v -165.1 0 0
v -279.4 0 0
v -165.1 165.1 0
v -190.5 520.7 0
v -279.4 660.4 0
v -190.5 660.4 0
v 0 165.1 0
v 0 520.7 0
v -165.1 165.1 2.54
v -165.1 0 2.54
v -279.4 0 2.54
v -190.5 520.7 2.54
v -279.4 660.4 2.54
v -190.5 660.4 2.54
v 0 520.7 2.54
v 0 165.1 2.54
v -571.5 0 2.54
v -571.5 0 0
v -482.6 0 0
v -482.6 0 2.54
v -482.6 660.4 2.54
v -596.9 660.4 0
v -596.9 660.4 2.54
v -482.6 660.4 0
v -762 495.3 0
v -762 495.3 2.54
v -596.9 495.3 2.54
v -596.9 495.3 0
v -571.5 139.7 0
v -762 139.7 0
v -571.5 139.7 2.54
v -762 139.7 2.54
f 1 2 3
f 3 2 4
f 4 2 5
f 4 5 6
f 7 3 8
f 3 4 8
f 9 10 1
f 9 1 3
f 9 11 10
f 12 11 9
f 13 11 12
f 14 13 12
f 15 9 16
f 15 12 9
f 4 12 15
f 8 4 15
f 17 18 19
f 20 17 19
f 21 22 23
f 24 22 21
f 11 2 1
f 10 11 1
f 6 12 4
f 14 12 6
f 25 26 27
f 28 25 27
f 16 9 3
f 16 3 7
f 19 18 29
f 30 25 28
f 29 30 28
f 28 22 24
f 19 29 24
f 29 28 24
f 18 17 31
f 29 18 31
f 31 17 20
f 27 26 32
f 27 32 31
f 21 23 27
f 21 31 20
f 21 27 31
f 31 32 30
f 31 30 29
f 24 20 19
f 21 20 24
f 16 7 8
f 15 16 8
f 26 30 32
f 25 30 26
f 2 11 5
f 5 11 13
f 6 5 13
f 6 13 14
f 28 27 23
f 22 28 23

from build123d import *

# Parameters (mm, degrees)
SKETCH1_W           = 762
SKETCH1_H           = 660.4
BOSS_EXTRUDE1_DEPTH = 2.54
SKETCH2_W           = 165.1
SKETCH2_H           = 165.1
SKETCH2_W_2         = 190.5
SKETCH2_H_2         = 139.7
CUT_EXTRUDE1_DEPTH  = 1009.354407736
SKETCH3_W           = 203.2
SKETCH3_H           = 660.4
CUT_EXTRUDE2_DEPTH  = 1009.354407736


with BuildPart() as part:
    # Sketch1 → Boss-Extrude1 (new body)
    with BuildSketch(Plane.XY):
        with Locations((-381, 330.2)):
            Rectangle(SKETCH1_W, SKETCH1_H)
    extrude(amount=BOSS_EXTRUDE1_DEPTH)

    # Sketch2 → Cut-Extrude1 (cut, through all)
    with BuildSketch(Plane.XY.offset(2.54)):
        with Locations((-679.45, 577.85)):
            Rectangle(SKETCH2_W, SKETCH2_H)
        with Locations((-95.25, 590.55)):
            Rectangle(SKETCH2_W_2, SKETCH2_H_2)
        with Locations((-82.55, 82.55)):
            Rectangle(SKETCH2_W, SKETCH2_H)
        with Locations((-666.75, 69.85)):
            Rectangle(SKETCH2_W_2, SKETCH2_H_2)
    extrude(amount=-CUT_EXTRUDE1_DEPTH, mode=Mode.SUBTRACT)

    # Sketch3 → Cut-Extrude2 (cut, through all)
    with BuildSketch(Plane.XY.offset(2.54)):
        with Locations((-381, 330.2)):
            Rectangle(SKETCH3_W, SKETCH3_H)
    extrude(amount=-CUT_EXTRUDE2_DEPTH, mode=Mode.SUBTRACT)


with BuildPart() as cut_extrude2_piece_1:
    # of the separate pieces the step leaves, piece 1, a body of its own (cut_extrude2_pieces)
    add(part.part.solids().sort_by_distance((-482.6, 0, 0))[0])


with BuildPart() as cut_extrude2_piece_2:
    # of the separate pieces the step leaves, piece 2, a body of its own (cut_extrude2_pieces)
    add(part.part.solids().sort_by_distance((-165.1, 0, 0))[0])


solid = Compound([cut_extrude2_piece_1.part, cut_extrude2_piece_2.part])
